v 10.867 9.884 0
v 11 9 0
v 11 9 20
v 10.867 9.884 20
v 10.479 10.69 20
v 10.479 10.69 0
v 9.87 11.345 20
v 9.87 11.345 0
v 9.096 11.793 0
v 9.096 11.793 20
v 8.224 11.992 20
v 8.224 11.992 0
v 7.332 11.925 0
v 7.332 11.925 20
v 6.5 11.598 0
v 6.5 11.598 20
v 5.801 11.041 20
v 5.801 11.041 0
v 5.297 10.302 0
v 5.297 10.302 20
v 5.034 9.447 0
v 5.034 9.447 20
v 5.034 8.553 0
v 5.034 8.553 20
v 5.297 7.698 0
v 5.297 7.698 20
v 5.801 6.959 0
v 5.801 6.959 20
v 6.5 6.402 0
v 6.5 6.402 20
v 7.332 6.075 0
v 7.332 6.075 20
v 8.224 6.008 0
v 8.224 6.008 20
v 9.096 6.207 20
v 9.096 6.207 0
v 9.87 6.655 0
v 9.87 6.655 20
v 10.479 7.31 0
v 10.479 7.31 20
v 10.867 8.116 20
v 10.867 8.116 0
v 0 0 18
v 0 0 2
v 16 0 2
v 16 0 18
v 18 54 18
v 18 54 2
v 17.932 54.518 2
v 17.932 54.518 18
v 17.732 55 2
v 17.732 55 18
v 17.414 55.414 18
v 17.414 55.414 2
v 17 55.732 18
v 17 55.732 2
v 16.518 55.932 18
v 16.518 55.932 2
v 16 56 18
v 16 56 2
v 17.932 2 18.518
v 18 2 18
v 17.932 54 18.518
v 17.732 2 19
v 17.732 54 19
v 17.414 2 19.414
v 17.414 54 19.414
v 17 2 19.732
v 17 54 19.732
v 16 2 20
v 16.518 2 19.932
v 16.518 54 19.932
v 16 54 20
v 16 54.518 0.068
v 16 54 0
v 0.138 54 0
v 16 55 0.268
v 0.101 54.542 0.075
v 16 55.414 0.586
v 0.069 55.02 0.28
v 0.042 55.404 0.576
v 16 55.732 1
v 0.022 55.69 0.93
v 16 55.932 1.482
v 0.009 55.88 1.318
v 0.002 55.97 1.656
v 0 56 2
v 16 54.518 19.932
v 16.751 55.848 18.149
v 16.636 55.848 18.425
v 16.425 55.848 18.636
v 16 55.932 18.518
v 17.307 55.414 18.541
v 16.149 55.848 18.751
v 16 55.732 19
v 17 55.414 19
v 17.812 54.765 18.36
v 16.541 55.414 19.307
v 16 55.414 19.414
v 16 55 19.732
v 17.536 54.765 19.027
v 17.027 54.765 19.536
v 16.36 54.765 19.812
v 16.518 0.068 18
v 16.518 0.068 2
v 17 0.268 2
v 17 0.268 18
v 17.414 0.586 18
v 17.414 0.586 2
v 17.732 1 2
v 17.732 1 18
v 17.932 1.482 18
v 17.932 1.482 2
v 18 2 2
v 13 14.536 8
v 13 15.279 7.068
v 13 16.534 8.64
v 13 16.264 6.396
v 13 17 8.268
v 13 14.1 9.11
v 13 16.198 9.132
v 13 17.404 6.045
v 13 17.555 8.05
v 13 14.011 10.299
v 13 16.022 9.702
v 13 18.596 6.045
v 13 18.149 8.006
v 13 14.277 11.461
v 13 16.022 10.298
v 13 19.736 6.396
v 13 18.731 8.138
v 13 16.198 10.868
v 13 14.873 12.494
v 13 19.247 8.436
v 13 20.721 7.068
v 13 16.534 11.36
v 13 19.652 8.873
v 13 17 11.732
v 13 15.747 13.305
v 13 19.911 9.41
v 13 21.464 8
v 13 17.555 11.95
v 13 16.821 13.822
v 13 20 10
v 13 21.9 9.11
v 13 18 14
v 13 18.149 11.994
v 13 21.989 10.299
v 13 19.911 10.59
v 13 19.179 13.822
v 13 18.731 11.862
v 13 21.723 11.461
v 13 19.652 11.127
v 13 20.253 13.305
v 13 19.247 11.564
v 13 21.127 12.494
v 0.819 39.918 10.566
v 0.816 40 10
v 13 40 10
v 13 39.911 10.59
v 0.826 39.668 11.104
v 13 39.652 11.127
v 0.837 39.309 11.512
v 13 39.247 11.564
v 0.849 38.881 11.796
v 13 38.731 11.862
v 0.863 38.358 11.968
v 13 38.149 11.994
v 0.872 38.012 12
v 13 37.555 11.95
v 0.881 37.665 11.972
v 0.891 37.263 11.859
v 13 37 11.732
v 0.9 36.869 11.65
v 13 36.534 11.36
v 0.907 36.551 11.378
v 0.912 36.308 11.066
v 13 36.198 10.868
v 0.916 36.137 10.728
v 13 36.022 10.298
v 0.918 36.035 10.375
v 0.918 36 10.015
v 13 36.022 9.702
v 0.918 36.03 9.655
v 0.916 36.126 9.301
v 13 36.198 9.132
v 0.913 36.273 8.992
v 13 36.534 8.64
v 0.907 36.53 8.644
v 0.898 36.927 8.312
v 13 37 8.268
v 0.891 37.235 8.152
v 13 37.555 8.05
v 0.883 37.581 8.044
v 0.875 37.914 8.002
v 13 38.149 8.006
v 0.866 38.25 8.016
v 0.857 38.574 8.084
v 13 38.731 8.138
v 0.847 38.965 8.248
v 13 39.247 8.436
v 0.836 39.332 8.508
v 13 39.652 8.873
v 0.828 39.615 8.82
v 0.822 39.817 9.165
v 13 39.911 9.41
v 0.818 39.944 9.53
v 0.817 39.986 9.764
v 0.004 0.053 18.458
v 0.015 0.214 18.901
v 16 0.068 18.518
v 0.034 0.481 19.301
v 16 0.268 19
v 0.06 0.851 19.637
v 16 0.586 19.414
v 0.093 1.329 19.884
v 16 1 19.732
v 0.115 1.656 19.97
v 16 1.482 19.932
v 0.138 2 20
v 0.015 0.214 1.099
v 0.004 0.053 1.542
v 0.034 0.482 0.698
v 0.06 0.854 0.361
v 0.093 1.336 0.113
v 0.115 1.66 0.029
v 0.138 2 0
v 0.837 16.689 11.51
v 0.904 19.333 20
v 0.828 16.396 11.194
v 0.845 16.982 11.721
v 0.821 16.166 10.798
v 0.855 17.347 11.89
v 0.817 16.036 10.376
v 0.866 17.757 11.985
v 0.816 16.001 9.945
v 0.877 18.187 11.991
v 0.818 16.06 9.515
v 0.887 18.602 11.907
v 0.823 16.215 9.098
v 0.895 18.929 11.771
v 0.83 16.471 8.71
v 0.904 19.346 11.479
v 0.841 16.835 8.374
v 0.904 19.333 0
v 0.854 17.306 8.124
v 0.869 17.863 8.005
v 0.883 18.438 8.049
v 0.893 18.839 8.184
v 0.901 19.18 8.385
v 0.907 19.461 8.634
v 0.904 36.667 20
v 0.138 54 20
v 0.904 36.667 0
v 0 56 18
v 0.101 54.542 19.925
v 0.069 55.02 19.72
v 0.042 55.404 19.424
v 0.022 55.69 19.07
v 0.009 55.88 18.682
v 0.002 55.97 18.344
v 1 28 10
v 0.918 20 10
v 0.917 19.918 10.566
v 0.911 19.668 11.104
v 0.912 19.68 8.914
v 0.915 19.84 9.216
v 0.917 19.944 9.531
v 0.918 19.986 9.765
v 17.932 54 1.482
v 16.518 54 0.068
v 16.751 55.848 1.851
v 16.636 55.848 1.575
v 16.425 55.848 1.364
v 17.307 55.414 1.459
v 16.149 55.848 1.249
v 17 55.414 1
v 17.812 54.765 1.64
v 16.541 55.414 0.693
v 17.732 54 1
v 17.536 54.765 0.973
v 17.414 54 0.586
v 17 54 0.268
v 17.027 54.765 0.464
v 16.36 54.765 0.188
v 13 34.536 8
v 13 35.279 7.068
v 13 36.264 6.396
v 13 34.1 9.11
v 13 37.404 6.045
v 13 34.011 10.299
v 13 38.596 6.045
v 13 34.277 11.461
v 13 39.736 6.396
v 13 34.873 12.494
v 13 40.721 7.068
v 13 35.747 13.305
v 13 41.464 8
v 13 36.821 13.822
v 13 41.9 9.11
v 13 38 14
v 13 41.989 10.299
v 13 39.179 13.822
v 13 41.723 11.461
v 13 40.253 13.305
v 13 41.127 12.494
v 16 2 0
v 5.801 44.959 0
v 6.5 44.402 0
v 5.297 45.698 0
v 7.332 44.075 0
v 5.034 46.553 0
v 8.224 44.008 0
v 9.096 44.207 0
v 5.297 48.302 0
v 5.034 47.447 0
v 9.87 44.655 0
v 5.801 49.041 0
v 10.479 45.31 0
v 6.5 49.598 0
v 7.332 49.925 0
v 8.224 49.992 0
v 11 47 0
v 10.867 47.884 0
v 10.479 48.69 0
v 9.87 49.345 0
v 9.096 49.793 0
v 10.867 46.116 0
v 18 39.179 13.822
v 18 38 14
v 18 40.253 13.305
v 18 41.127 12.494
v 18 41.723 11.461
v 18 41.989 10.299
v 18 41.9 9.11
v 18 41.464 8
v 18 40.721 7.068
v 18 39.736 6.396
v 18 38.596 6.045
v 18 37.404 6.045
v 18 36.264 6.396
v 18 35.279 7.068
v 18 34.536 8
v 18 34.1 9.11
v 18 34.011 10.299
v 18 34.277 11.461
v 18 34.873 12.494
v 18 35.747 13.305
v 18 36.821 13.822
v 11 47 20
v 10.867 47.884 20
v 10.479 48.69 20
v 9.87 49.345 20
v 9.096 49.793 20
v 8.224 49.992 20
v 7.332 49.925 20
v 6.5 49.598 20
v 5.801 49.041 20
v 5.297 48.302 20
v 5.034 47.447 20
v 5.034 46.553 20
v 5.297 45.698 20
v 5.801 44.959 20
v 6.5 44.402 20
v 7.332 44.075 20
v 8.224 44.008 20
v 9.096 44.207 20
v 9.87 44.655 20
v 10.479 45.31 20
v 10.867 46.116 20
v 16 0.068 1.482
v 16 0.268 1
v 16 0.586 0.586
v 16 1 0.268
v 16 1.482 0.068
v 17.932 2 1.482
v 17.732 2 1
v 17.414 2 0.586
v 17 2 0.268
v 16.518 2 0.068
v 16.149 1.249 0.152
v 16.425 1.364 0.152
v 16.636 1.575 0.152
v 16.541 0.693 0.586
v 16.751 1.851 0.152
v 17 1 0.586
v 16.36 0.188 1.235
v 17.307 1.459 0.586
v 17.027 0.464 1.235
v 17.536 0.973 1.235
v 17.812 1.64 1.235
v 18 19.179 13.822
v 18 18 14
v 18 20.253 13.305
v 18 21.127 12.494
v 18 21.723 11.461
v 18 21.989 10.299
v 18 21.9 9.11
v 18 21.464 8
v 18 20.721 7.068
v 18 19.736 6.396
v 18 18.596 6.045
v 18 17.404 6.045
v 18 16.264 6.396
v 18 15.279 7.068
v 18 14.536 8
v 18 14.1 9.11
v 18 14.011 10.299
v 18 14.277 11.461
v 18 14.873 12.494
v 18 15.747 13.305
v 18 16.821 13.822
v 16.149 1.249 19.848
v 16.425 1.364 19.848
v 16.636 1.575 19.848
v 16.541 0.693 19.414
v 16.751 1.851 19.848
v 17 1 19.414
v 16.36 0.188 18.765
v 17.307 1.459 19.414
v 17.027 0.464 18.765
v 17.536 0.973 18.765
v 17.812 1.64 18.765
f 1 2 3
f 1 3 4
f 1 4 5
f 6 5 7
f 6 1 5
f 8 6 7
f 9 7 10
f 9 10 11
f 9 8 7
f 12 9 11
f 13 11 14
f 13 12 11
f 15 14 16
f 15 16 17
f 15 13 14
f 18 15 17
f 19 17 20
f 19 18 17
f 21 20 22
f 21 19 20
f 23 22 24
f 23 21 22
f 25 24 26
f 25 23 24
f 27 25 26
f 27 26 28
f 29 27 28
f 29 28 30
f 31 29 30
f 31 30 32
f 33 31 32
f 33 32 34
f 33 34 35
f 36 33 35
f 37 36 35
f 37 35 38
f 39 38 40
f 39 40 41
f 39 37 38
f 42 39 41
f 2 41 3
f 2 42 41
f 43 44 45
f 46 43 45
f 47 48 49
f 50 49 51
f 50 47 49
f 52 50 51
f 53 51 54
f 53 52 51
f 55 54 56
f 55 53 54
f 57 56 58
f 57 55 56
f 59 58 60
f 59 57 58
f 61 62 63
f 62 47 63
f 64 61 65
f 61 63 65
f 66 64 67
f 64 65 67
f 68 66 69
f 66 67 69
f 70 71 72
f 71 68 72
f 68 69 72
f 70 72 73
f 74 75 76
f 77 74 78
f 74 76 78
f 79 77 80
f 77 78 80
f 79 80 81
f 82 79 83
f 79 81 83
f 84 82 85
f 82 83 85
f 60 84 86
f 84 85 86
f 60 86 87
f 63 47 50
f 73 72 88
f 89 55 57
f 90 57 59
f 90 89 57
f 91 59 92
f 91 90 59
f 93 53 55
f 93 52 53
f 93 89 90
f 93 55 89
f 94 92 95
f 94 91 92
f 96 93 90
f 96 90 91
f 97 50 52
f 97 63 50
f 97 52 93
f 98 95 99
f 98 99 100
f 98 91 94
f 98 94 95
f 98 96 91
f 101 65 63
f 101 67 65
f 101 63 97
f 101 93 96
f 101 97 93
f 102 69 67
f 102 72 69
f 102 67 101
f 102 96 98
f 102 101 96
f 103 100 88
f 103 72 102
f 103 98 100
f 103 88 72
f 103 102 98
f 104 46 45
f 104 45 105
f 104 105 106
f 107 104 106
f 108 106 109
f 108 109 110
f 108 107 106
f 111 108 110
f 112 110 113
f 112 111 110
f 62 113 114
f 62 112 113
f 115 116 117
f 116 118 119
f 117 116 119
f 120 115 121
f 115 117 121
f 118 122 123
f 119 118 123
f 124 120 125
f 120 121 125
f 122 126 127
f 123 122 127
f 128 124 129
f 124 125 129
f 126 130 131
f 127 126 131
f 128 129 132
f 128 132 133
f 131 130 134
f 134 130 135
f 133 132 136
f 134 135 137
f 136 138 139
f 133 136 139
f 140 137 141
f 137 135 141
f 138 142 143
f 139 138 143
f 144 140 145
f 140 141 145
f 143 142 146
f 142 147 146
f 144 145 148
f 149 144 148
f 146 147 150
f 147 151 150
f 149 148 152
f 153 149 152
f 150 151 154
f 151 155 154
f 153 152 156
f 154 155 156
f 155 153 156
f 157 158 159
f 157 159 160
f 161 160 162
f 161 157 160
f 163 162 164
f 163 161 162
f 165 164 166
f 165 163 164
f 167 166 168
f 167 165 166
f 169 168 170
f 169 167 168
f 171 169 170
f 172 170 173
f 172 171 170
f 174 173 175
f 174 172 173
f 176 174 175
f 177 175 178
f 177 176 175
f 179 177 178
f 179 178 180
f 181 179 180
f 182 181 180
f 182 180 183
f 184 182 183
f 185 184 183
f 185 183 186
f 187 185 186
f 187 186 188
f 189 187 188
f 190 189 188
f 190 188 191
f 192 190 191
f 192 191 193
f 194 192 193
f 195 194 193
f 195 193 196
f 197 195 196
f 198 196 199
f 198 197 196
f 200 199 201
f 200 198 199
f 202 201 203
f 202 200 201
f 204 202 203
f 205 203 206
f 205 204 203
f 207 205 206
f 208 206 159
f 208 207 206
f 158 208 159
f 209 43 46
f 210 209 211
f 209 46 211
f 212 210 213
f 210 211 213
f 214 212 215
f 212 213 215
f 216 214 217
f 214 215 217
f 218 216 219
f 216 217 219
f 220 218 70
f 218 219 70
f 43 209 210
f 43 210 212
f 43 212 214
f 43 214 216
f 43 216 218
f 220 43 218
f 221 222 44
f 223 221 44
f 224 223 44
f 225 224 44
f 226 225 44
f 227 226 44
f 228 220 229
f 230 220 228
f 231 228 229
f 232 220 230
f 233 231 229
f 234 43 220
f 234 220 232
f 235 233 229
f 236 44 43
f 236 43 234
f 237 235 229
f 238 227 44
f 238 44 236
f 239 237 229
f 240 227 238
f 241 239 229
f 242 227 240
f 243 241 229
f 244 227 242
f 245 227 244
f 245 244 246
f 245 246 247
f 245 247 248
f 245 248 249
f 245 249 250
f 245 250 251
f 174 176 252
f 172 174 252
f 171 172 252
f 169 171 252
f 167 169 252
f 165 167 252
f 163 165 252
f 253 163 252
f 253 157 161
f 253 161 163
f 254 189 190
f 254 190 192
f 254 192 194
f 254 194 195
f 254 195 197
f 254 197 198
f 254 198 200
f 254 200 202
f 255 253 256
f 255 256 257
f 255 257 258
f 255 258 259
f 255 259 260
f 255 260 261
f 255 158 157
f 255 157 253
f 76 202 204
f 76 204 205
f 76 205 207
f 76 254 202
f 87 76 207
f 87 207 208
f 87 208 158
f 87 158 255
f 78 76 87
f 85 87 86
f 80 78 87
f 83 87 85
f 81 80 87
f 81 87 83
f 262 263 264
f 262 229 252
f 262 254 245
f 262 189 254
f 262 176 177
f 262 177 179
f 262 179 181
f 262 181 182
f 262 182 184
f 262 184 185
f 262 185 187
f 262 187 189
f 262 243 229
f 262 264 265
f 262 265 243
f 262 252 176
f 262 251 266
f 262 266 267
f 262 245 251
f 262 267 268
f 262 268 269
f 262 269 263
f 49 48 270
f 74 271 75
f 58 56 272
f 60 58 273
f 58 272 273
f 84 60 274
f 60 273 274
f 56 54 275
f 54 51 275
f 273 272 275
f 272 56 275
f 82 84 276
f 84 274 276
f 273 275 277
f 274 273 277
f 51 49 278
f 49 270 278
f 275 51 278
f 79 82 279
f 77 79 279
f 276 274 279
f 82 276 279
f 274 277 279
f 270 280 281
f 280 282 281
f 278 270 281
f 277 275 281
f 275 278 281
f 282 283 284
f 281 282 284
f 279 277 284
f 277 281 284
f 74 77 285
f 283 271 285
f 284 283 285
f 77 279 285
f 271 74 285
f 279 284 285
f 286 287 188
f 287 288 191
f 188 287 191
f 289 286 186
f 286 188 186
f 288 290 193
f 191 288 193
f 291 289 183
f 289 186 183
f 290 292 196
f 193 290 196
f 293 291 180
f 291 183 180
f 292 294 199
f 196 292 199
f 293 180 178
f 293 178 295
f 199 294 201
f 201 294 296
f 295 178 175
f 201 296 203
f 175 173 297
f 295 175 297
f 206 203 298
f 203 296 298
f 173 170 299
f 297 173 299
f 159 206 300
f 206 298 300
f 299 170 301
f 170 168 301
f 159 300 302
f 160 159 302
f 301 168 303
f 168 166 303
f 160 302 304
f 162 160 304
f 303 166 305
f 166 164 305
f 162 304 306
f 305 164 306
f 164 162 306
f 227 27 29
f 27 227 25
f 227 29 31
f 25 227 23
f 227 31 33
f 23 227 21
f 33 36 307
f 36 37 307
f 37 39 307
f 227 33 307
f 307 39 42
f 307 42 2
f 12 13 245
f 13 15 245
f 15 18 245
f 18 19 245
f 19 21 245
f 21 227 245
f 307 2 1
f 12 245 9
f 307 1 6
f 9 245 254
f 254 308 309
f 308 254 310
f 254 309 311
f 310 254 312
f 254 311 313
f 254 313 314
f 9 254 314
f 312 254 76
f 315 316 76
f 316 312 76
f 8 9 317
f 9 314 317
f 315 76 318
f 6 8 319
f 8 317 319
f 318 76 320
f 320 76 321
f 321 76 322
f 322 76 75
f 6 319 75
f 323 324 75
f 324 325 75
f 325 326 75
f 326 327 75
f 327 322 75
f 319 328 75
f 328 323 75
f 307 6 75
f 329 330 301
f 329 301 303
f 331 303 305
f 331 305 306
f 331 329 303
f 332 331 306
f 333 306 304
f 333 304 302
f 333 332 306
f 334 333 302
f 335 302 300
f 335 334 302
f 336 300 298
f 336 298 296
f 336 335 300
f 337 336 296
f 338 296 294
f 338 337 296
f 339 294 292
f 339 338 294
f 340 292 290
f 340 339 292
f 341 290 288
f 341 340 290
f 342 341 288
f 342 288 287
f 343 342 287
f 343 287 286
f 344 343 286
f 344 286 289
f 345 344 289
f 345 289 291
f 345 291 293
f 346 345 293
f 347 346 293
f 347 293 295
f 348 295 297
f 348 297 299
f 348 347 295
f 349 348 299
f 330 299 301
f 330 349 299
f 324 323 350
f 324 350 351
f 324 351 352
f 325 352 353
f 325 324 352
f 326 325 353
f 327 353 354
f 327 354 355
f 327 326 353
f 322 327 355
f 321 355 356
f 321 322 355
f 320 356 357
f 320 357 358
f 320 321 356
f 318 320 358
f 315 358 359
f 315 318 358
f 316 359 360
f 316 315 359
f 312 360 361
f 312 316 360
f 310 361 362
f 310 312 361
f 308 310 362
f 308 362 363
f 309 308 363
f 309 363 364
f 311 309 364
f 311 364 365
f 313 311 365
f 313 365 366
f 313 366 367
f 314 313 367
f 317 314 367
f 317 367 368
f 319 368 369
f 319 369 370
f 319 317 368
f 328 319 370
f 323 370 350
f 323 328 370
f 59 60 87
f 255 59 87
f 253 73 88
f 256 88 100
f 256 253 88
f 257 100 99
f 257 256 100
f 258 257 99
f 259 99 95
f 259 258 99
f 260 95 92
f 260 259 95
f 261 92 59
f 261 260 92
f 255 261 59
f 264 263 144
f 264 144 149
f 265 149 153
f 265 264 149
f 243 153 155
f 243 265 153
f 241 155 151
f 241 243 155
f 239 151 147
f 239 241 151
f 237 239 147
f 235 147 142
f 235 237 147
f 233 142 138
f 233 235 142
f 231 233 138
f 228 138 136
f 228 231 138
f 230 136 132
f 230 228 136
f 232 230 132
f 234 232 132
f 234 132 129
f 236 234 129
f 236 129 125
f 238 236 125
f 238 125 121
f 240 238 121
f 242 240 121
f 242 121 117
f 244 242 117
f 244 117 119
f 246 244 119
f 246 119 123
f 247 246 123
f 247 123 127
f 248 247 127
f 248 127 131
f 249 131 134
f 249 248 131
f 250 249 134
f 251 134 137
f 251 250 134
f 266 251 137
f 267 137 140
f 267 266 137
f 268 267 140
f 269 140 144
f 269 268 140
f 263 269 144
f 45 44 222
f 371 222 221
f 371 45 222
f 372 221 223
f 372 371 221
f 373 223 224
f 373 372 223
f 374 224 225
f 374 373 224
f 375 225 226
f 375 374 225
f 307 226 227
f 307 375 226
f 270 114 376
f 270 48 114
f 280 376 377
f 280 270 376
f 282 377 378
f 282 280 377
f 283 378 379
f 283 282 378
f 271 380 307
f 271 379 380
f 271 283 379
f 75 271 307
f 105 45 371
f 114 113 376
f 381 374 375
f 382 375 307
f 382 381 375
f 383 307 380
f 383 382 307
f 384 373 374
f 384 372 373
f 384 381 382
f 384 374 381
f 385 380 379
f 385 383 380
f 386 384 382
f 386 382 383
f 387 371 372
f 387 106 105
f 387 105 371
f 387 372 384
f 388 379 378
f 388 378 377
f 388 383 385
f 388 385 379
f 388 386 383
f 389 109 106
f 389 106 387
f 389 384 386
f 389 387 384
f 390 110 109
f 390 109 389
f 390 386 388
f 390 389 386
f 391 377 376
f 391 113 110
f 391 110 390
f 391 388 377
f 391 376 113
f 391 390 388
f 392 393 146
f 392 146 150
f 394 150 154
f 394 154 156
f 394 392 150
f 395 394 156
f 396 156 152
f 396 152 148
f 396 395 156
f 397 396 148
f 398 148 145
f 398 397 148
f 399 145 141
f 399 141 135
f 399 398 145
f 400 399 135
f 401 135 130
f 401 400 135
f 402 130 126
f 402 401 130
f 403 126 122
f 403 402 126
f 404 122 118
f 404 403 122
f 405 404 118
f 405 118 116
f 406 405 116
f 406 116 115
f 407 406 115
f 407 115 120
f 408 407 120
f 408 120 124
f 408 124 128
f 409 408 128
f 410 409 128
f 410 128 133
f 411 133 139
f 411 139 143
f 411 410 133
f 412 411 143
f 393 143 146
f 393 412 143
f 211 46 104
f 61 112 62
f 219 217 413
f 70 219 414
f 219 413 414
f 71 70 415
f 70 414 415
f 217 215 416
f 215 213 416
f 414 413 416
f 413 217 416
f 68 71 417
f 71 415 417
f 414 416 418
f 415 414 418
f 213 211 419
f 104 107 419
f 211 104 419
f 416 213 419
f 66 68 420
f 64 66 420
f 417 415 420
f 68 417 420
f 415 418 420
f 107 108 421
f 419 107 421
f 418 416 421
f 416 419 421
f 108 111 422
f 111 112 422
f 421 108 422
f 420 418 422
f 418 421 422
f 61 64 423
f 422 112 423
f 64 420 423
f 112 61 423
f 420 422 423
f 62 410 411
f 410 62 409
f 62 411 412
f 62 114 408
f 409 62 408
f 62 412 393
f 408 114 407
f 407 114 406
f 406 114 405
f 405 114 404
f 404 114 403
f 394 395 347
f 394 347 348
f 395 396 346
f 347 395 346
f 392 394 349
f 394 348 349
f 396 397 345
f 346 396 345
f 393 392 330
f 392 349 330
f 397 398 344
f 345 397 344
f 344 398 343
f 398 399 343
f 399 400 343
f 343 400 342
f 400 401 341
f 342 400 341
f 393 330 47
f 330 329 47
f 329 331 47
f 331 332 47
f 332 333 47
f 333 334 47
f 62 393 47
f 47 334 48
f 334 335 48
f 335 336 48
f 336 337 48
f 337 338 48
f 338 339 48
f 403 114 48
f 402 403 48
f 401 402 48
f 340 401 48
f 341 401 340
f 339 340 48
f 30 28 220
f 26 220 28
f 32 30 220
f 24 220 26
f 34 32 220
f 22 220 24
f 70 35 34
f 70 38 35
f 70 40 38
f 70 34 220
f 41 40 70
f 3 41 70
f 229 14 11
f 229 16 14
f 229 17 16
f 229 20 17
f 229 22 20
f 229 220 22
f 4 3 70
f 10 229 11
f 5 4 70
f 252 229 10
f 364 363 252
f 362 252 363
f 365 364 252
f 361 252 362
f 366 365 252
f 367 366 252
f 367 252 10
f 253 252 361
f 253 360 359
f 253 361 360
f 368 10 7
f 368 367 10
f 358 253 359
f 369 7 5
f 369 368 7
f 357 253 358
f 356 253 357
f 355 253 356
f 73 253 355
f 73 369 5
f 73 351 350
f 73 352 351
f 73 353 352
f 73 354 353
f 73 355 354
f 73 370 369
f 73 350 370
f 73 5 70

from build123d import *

# Parameters (mm, degrees)
CYLINDER001_R     = 4
CYLINDER001_DEPTH = 5
CYLINDER_R        = 4
CYLINDER_DEPTH    = 5
SKETCH002_R       = 2
PAD002_DEPTH      = 18
SKETCH001_R       = 2
PAD001_DEPTH      = 18
SKETCH_R          = 3
PAD_DEPTH         = 20
FILLET_R          = 2


with BuildPart() as cylinder001:
    # Cylinder001 → Cylinder001 (new body)
    with BuildSketch(Plane(origin=(18, 38, 10), x_dir=(0, 0, 1), z_dir=(-1, 0, 0))):
        Circle(CYLINDER001_R)
    extrude(amount=CYLINDER001_DEPTH)


with BuildPart() as cylinder:
    # Cylinder → Cylinder (new body)
    with BuildSketch(Plane(origin=(18, 18, 10), x_dir=(0, 0, 1), z_dir=(-1, 0, 0))):
        Circle(CYLINDER_R)
    extrude(amount=CYLINDER_DEPTH)


with BuildPart() as body002:
    # Sketch002 → Pad002 (new body)
    with BuildSketch(Plane.YZ):
        with Locations((18, 10)):
            Circle(SKETCH002_R)
    extrude(amount=PAD002_DEPTH)


with BuildPart() as body002_1:
    # Body002 placement: moved
    add(body002.part.moved(Location((0, 20, 0))))


with BuildPart() as body001:
    # Sketch001 → Pad001 (new body)
    with BuildSketch(Plane.YZ):
        with Locations((18, 10)):
            Circle(SKETCH001_R)
    extrude(amount=PAD001_DEPTH)


with BuildPart() as fillet_body:
    # Sketch → Pad (new body)
    with BuildSketch(Plane.XY):
        with BuildLine():
            Line((0, 0), (18, 0))
            Line((18, 0), (18, 56))
            Line((18, 56), (0, 56))
            add(Edge.make_bspline(
                [(0, 0), (2, 28), (0, 56)],
                knots=[0, 0, 0, 1, 1, 1], degree=2))
        make_face()
        with Locations((8, 47)):
            Circle(SKETCH_R, mode=Mode.SUBTRACT)
        with Locations((8, 9)):
            Circle(SKETCH_R, mode=Mode.SUBTRACT)
    extrude(amount=PAD_DEPTH)

    # Boolean: cut Body002, Body001
    add(body002_1.part, mode=Mode.SUBTRACT)
    add(body001.part, mode=Mode.SUBTRACT)

    # Cut: cut Cylinder
    add(cylinder.part, mode=Mode.SUBTRACT)

    # Cut001: cut Cylinder001
    add(cylinder001.part, mode=Mode.SUBTRACT)

    # Fillet
    fillet_edges = [fillet_body.edges().sort_by_distance(p)[0] for p in [
        (18, 0, 10),
        (9, 0, 0),
        (9, 0, 20),
        (18, 28, 0),
        (18, 28, 20),
        (18, 56, 10),
        (9, 56, 0),
        (9, 56, 20),
    ]]
    fillet(fillet_edges, radius=FILLET_R)


solid = fillet_body.part
